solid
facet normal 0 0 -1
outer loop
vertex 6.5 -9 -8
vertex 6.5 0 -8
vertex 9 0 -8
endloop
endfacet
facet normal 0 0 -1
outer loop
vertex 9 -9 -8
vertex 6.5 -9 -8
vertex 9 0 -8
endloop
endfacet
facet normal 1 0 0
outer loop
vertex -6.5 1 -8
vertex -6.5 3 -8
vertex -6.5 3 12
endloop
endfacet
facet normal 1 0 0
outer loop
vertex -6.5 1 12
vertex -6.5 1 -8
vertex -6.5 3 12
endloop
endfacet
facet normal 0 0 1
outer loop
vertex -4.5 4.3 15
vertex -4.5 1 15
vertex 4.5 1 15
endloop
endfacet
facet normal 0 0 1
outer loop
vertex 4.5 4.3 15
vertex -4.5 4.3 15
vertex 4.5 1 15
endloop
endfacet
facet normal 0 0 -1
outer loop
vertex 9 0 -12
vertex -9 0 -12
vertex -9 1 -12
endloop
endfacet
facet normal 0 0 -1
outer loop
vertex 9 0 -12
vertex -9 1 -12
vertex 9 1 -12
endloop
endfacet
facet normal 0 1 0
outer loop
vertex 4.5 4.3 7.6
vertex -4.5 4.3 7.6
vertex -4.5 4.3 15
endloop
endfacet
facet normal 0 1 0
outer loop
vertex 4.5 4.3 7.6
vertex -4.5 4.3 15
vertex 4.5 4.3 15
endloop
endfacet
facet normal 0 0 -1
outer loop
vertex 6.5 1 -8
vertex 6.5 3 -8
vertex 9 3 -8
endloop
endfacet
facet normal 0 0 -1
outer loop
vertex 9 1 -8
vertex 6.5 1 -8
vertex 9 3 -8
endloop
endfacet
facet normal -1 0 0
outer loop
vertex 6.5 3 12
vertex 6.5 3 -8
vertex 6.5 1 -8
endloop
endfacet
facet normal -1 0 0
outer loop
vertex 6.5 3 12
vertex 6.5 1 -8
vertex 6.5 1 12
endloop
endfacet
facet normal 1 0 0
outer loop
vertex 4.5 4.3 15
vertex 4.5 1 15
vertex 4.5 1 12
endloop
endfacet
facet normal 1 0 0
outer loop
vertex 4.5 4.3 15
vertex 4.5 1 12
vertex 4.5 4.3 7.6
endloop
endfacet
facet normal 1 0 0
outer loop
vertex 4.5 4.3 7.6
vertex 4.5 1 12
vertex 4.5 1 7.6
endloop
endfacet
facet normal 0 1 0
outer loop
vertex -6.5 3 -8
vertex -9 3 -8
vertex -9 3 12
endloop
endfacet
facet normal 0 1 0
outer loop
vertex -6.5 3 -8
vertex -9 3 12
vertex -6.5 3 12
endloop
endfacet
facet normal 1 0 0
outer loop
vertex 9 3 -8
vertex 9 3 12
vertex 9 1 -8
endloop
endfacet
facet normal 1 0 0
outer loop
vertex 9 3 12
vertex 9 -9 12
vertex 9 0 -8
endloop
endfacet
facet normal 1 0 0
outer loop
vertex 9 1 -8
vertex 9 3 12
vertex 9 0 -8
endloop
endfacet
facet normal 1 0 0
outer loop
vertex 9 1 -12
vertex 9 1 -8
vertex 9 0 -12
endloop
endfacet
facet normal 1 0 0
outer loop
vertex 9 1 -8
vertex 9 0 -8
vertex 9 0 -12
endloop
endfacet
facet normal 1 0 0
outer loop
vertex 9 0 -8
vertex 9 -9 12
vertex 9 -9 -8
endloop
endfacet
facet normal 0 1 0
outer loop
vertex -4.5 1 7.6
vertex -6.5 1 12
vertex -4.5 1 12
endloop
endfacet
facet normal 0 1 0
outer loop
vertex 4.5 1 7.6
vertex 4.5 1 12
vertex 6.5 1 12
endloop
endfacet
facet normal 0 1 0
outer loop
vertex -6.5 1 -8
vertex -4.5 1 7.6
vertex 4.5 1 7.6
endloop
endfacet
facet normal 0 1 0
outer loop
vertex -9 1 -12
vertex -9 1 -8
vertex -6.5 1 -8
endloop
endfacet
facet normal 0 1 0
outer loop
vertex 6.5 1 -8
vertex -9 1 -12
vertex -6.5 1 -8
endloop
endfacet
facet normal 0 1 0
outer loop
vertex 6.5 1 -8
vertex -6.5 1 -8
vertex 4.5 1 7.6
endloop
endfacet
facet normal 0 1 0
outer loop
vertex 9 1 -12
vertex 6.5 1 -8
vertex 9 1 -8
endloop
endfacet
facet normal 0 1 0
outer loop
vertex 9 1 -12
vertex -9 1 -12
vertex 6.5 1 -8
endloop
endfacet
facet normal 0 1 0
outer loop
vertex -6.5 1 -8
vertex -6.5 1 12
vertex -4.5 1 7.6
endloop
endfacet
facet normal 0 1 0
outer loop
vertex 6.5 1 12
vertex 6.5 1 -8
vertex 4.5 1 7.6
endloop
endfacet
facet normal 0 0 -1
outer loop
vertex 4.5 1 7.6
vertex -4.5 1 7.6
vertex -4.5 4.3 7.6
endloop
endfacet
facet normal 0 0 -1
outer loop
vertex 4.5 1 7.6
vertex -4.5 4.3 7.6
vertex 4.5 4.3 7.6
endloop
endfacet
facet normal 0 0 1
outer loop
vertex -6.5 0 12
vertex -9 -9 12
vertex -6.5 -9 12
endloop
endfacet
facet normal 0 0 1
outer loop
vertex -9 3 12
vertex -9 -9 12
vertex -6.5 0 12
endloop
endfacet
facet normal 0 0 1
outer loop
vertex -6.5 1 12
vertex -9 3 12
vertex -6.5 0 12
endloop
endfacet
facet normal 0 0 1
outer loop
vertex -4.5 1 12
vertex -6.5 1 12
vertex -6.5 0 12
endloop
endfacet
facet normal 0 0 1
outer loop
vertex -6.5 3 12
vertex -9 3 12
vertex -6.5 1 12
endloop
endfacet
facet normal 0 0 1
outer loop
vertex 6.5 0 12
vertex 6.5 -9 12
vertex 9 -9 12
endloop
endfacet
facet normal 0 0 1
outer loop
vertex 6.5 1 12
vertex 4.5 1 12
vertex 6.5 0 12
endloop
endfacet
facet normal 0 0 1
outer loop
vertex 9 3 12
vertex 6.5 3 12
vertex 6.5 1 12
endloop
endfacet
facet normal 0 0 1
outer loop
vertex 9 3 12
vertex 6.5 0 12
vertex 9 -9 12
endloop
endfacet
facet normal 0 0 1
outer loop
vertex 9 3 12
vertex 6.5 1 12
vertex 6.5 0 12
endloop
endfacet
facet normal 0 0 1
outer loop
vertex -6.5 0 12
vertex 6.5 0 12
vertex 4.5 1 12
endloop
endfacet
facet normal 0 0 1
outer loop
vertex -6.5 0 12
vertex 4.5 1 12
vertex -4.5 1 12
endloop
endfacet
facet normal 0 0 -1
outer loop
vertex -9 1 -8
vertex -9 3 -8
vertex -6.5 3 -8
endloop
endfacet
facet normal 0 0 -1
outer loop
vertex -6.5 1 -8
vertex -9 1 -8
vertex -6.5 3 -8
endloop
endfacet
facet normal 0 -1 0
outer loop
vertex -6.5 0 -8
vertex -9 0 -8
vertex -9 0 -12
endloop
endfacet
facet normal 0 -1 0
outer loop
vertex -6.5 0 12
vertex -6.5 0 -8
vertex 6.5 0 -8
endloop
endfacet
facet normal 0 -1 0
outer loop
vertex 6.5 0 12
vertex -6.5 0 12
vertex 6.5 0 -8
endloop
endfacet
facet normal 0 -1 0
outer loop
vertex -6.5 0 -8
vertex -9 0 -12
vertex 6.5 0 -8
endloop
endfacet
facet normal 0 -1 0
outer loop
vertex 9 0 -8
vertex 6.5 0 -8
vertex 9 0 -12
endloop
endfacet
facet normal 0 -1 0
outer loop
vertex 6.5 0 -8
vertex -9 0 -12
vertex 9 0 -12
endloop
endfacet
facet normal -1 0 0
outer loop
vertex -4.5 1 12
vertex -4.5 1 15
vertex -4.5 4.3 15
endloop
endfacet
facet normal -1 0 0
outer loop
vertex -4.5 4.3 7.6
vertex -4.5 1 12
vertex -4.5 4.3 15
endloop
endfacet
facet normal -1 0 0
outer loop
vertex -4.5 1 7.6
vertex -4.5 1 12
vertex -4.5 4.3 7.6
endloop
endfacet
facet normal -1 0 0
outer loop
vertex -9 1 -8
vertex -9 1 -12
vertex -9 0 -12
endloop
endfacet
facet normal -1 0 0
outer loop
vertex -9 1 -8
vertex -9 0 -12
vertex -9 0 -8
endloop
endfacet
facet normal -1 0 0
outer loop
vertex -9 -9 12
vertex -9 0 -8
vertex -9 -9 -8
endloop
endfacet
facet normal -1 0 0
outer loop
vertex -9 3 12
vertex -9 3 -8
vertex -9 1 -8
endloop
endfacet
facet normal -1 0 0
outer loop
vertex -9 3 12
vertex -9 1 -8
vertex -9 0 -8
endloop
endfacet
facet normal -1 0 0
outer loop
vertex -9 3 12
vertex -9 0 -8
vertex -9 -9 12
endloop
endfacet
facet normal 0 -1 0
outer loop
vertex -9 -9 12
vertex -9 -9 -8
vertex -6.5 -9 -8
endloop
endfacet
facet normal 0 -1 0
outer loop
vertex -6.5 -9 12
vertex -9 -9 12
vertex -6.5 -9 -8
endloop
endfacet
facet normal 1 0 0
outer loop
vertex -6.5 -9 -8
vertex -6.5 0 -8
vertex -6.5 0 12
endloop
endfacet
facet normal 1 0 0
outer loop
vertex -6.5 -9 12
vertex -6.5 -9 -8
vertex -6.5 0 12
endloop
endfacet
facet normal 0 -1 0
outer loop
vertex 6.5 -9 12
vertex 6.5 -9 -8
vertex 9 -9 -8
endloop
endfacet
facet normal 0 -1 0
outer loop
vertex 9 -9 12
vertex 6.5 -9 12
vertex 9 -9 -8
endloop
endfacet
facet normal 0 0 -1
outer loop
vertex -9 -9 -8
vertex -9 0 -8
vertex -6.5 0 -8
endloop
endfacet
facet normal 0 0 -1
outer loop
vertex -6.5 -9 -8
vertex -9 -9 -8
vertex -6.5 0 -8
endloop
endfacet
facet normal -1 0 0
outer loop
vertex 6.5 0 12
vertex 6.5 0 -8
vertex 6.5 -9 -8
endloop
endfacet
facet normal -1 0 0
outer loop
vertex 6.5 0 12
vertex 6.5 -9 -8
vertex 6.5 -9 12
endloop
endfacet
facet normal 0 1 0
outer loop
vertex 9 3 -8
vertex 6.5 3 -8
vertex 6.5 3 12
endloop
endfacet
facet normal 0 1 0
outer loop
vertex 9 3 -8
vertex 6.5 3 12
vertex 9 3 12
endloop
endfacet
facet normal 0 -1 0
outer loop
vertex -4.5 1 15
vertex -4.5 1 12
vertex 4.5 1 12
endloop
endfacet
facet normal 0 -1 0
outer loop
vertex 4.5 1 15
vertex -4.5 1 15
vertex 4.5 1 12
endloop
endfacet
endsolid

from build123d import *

# Parameters (mm, degrees)
SKETCH_1_W           = 18
SKETCH_1_H           = 24
EXTRUDE_1_DEPTH      = 1
SKETCH_2_W           = 9
SKETCH_2_H           = 7.4
EXTRUDE_2_DEPTH      = 3.3
EXTRUDE_3_DEPTH      = 9
EXTRUDE_3_DEPTH_BACK = 3
SKETCH_3_W           = 2.5
SKETCH_3_H           = 20


with BuildPart() as part:
    # 草图1 → 凸台-拉伸1 (new body)
    with BuildSketch(Plane(origin=(0, 0, 0), x_dir=(1, 0, 0), z_dir=(0, 1, 0))):
        Rectangle(SKETCH_1_W, SKETCH_1_H)
    extrude(amount=EXTRUDE_1_DEPTH)

    # 草图2 → 凸台-拉伸2 (add)
    with BuildSketch(Plane(origin=(0, 1, 0), x_dir=(1, 0, 0), z_dir=(0, 1, 0))):
        with Locations((0, -11.3)):
            Rectangle(SKETCH_2_W, SKETCH_2_H)
    extrude(amount=EXTRUDE_2_DEPTH)

    # 草图3 → 凸台-拉伸3 (add, two sides: drawn at the far end of the back side and taken through both)
    with BuildSketch(Plane.XZ.offset(-EXTRUDE_3_DEPTH_BACK)):
        with Locations((-7.75, 2)):
            Rectangle(SKETCH_3_W, SKETCH_3_H)
        with Locations((7.75, 2)):
            Rectangle(SKETCH_3_W, SKETCH_3_H)
    extrude(amount=EXTRUDE_3_DEPTH + EXTRUDE_3_DEPTH_BACK)


solid = part.part
